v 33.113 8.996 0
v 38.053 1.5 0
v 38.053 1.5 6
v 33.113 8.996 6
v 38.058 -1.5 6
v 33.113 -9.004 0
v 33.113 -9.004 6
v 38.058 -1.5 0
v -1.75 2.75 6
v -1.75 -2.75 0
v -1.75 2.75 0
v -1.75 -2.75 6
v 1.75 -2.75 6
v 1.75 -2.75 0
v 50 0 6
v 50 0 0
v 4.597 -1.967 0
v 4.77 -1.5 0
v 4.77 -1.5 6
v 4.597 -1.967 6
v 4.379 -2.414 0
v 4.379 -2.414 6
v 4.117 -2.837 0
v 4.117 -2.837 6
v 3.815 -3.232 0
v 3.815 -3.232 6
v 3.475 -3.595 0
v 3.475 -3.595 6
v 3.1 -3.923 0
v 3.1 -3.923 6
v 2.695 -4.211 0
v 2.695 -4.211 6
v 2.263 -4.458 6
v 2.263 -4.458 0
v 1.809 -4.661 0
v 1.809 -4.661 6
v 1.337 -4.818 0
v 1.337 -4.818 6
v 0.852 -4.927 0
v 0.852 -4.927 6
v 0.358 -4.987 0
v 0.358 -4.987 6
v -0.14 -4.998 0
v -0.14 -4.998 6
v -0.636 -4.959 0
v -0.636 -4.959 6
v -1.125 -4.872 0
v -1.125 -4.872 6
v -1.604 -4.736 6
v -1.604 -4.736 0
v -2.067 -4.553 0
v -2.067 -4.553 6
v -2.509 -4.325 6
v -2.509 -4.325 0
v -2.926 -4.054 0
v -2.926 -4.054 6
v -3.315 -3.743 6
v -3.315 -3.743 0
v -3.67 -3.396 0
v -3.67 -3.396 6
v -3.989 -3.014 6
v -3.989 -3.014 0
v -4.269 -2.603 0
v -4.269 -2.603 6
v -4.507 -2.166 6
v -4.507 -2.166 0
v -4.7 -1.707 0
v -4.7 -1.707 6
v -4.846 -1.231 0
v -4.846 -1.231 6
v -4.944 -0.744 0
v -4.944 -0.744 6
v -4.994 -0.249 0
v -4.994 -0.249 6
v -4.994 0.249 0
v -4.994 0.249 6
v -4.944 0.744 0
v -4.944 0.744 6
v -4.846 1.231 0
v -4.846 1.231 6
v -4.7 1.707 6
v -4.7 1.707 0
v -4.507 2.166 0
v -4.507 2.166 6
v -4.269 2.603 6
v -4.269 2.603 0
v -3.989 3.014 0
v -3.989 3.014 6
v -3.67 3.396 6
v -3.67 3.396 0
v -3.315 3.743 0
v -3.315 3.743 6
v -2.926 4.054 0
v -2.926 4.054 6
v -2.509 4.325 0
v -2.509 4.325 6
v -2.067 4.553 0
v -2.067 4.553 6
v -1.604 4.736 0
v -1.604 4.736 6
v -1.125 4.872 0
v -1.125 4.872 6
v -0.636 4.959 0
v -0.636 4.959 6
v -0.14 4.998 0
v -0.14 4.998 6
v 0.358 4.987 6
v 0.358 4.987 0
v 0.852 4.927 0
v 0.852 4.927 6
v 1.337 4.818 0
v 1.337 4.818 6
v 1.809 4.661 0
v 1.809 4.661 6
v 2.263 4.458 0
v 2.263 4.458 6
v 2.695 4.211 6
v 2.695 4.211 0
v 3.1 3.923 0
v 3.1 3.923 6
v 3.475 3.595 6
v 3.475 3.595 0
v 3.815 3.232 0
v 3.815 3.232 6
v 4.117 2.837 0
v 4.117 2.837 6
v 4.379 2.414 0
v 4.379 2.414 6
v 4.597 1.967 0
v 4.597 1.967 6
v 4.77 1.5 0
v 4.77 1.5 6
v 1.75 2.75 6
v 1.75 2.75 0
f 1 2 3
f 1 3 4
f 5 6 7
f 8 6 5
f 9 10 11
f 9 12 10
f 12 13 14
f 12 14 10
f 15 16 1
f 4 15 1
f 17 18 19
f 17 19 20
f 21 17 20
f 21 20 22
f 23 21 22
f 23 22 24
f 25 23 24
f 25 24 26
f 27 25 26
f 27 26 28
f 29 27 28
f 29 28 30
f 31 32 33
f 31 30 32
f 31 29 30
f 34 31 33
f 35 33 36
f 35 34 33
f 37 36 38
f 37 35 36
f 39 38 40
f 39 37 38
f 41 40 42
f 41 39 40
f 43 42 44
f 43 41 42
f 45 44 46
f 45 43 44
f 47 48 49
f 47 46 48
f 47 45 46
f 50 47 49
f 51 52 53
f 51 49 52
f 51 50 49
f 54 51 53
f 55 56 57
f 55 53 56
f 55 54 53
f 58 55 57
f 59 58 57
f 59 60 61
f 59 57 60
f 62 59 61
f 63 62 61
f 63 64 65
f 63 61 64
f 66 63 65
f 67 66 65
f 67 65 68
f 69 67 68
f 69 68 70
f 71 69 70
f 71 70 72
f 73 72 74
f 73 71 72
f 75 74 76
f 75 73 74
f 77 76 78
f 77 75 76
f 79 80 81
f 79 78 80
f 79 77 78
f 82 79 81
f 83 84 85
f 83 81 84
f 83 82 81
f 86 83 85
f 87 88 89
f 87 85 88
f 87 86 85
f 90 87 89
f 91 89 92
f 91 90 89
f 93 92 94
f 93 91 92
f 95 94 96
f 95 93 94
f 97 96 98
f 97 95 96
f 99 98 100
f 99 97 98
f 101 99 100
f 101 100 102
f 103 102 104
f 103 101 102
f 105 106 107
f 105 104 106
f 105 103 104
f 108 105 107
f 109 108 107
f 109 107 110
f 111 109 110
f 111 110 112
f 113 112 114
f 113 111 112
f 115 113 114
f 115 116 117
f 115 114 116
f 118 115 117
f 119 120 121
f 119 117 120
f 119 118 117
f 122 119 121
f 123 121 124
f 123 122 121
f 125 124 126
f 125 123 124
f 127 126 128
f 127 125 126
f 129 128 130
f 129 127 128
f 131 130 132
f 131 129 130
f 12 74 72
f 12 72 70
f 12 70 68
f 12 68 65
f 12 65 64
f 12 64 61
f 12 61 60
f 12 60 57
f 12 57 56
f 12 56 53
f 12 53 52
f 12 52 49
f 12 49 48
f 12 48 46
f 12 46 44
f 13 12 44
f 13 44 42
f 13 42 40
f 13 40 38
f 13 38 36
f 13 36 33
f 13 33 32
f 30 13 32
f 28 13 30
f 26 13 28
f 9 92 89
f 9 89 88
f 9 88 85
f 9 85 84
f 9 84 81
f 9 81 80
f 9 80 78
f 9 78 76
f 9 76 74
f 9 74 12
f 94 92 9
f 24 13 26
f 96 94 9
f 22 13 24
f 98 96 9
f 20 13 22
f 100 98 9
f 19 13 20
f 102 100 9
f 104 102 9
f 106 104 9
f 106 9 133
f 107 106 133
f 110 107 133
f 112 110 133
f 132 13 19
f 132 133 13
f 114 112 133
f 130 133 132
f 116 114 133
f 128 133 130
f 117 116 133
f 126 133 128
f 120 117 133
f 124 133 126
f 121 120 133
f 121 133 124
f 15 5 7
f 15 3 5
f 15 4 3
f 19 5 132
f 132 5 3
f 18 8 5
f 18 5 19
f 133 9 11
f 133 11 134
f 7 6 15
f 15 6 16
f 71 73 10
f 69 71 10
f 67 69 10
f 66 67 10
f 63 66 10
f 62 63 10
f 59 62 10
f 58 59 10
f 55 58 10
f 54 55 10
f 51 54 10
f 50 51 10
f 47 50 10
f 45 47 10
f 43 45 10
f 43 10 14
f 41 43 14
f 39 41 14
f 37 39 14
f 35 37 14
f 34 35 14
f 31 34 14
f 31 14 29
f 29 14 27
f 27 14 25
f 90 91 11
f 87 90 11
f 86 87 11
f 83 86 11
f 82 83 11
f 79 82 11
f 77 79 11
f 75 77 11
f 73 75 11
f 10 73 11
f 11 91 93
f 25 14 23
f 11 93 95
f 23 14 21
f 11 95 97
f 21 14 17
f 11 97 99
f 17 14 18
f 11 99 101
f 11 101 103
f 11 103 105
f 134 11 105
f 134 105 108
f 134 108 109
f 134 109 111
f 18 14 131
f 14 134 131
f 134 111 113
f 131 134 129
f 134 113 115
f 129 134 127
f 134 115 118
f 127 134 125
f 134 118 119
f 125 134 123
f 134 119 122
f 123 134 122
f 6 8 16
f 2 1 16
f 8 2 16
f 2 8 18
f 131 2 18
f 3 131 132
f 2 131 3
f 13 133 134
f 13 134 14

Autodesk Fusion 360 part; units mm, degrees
sketch "Sketch1" plane through (0, 0, 0) normal (0, 0, 1) x (1, 0, 0)
  line L0 (38.058, -1.5) -> (4.7697, -1.5)
  line L1 (4.7697, 1.5) -> (38.0528, 1.5)
  line L2 (50, 0) -> (33.1127, 8.996)
  line L3 (33.1127, -9.004) -> (50, 0)
  line L4 (33.1127, -9.004) -> (38.058, -1.5)
  line L5 (38.0528, 1.5) -> (33.1127, 8.996)
  arc A0 (4.7697, 1.5) -> (4.7697, -1.5) centre (0, 0) ccw
  point P0 (33.1127, 8.996)
  point P1 (33.1127, -9.004)
  point P2 (39.044, -0.004)
  dimension "d1" = 10
extrude "Extrude1" add sketch "Sketch1" along normal blind 6
sketch "Sketch2" plane through (0, 0, 6) normal (0, 0, 1) x (-1, 0, 0)
  line L0 (-38.0528, -1.5) -> (-4.7697, -1.5)
  arc A0 (-4.7697, -1.5) -> (-4.7697, 1.5) centre (0, 0) ccw
  line L1 (-4.7697, 1.5) -> (-38.058, 1.5)
  line L2 (-38.058, 1.5) -> (-33.1127, 9.004)
  line L3 (-33.1127, 9.004) -> (-50, 0)
  line L4 (-50, 0) -> (-33.1127, -8.996)
  line L5 (-33.1127, -8.996) -> (-38.0528, -1.5)
  line L6 (1.75, -2.75) -> (-1.75, -2.75)
  line L7 (-1.75, -2.75) -> (-1.75, 2.75)
  line L8 (-1.75, 2.75) -> (1.75, 2.75)
  line L9 (1.75, 2.75) -> (1.75, -2.75)
  line L10 (1.75, -2.75) -> (-1.75, 2.75) construction
  line L11 (-1.75, -2.75) -> (1.75, 2.75) construction
  dimension "d9" = 3.5
  dimension "d10" = 5.5
extrude "Extrude2" cut sketch "Sketch2" against normal blind 6 contours L6 L7 L8 L9
